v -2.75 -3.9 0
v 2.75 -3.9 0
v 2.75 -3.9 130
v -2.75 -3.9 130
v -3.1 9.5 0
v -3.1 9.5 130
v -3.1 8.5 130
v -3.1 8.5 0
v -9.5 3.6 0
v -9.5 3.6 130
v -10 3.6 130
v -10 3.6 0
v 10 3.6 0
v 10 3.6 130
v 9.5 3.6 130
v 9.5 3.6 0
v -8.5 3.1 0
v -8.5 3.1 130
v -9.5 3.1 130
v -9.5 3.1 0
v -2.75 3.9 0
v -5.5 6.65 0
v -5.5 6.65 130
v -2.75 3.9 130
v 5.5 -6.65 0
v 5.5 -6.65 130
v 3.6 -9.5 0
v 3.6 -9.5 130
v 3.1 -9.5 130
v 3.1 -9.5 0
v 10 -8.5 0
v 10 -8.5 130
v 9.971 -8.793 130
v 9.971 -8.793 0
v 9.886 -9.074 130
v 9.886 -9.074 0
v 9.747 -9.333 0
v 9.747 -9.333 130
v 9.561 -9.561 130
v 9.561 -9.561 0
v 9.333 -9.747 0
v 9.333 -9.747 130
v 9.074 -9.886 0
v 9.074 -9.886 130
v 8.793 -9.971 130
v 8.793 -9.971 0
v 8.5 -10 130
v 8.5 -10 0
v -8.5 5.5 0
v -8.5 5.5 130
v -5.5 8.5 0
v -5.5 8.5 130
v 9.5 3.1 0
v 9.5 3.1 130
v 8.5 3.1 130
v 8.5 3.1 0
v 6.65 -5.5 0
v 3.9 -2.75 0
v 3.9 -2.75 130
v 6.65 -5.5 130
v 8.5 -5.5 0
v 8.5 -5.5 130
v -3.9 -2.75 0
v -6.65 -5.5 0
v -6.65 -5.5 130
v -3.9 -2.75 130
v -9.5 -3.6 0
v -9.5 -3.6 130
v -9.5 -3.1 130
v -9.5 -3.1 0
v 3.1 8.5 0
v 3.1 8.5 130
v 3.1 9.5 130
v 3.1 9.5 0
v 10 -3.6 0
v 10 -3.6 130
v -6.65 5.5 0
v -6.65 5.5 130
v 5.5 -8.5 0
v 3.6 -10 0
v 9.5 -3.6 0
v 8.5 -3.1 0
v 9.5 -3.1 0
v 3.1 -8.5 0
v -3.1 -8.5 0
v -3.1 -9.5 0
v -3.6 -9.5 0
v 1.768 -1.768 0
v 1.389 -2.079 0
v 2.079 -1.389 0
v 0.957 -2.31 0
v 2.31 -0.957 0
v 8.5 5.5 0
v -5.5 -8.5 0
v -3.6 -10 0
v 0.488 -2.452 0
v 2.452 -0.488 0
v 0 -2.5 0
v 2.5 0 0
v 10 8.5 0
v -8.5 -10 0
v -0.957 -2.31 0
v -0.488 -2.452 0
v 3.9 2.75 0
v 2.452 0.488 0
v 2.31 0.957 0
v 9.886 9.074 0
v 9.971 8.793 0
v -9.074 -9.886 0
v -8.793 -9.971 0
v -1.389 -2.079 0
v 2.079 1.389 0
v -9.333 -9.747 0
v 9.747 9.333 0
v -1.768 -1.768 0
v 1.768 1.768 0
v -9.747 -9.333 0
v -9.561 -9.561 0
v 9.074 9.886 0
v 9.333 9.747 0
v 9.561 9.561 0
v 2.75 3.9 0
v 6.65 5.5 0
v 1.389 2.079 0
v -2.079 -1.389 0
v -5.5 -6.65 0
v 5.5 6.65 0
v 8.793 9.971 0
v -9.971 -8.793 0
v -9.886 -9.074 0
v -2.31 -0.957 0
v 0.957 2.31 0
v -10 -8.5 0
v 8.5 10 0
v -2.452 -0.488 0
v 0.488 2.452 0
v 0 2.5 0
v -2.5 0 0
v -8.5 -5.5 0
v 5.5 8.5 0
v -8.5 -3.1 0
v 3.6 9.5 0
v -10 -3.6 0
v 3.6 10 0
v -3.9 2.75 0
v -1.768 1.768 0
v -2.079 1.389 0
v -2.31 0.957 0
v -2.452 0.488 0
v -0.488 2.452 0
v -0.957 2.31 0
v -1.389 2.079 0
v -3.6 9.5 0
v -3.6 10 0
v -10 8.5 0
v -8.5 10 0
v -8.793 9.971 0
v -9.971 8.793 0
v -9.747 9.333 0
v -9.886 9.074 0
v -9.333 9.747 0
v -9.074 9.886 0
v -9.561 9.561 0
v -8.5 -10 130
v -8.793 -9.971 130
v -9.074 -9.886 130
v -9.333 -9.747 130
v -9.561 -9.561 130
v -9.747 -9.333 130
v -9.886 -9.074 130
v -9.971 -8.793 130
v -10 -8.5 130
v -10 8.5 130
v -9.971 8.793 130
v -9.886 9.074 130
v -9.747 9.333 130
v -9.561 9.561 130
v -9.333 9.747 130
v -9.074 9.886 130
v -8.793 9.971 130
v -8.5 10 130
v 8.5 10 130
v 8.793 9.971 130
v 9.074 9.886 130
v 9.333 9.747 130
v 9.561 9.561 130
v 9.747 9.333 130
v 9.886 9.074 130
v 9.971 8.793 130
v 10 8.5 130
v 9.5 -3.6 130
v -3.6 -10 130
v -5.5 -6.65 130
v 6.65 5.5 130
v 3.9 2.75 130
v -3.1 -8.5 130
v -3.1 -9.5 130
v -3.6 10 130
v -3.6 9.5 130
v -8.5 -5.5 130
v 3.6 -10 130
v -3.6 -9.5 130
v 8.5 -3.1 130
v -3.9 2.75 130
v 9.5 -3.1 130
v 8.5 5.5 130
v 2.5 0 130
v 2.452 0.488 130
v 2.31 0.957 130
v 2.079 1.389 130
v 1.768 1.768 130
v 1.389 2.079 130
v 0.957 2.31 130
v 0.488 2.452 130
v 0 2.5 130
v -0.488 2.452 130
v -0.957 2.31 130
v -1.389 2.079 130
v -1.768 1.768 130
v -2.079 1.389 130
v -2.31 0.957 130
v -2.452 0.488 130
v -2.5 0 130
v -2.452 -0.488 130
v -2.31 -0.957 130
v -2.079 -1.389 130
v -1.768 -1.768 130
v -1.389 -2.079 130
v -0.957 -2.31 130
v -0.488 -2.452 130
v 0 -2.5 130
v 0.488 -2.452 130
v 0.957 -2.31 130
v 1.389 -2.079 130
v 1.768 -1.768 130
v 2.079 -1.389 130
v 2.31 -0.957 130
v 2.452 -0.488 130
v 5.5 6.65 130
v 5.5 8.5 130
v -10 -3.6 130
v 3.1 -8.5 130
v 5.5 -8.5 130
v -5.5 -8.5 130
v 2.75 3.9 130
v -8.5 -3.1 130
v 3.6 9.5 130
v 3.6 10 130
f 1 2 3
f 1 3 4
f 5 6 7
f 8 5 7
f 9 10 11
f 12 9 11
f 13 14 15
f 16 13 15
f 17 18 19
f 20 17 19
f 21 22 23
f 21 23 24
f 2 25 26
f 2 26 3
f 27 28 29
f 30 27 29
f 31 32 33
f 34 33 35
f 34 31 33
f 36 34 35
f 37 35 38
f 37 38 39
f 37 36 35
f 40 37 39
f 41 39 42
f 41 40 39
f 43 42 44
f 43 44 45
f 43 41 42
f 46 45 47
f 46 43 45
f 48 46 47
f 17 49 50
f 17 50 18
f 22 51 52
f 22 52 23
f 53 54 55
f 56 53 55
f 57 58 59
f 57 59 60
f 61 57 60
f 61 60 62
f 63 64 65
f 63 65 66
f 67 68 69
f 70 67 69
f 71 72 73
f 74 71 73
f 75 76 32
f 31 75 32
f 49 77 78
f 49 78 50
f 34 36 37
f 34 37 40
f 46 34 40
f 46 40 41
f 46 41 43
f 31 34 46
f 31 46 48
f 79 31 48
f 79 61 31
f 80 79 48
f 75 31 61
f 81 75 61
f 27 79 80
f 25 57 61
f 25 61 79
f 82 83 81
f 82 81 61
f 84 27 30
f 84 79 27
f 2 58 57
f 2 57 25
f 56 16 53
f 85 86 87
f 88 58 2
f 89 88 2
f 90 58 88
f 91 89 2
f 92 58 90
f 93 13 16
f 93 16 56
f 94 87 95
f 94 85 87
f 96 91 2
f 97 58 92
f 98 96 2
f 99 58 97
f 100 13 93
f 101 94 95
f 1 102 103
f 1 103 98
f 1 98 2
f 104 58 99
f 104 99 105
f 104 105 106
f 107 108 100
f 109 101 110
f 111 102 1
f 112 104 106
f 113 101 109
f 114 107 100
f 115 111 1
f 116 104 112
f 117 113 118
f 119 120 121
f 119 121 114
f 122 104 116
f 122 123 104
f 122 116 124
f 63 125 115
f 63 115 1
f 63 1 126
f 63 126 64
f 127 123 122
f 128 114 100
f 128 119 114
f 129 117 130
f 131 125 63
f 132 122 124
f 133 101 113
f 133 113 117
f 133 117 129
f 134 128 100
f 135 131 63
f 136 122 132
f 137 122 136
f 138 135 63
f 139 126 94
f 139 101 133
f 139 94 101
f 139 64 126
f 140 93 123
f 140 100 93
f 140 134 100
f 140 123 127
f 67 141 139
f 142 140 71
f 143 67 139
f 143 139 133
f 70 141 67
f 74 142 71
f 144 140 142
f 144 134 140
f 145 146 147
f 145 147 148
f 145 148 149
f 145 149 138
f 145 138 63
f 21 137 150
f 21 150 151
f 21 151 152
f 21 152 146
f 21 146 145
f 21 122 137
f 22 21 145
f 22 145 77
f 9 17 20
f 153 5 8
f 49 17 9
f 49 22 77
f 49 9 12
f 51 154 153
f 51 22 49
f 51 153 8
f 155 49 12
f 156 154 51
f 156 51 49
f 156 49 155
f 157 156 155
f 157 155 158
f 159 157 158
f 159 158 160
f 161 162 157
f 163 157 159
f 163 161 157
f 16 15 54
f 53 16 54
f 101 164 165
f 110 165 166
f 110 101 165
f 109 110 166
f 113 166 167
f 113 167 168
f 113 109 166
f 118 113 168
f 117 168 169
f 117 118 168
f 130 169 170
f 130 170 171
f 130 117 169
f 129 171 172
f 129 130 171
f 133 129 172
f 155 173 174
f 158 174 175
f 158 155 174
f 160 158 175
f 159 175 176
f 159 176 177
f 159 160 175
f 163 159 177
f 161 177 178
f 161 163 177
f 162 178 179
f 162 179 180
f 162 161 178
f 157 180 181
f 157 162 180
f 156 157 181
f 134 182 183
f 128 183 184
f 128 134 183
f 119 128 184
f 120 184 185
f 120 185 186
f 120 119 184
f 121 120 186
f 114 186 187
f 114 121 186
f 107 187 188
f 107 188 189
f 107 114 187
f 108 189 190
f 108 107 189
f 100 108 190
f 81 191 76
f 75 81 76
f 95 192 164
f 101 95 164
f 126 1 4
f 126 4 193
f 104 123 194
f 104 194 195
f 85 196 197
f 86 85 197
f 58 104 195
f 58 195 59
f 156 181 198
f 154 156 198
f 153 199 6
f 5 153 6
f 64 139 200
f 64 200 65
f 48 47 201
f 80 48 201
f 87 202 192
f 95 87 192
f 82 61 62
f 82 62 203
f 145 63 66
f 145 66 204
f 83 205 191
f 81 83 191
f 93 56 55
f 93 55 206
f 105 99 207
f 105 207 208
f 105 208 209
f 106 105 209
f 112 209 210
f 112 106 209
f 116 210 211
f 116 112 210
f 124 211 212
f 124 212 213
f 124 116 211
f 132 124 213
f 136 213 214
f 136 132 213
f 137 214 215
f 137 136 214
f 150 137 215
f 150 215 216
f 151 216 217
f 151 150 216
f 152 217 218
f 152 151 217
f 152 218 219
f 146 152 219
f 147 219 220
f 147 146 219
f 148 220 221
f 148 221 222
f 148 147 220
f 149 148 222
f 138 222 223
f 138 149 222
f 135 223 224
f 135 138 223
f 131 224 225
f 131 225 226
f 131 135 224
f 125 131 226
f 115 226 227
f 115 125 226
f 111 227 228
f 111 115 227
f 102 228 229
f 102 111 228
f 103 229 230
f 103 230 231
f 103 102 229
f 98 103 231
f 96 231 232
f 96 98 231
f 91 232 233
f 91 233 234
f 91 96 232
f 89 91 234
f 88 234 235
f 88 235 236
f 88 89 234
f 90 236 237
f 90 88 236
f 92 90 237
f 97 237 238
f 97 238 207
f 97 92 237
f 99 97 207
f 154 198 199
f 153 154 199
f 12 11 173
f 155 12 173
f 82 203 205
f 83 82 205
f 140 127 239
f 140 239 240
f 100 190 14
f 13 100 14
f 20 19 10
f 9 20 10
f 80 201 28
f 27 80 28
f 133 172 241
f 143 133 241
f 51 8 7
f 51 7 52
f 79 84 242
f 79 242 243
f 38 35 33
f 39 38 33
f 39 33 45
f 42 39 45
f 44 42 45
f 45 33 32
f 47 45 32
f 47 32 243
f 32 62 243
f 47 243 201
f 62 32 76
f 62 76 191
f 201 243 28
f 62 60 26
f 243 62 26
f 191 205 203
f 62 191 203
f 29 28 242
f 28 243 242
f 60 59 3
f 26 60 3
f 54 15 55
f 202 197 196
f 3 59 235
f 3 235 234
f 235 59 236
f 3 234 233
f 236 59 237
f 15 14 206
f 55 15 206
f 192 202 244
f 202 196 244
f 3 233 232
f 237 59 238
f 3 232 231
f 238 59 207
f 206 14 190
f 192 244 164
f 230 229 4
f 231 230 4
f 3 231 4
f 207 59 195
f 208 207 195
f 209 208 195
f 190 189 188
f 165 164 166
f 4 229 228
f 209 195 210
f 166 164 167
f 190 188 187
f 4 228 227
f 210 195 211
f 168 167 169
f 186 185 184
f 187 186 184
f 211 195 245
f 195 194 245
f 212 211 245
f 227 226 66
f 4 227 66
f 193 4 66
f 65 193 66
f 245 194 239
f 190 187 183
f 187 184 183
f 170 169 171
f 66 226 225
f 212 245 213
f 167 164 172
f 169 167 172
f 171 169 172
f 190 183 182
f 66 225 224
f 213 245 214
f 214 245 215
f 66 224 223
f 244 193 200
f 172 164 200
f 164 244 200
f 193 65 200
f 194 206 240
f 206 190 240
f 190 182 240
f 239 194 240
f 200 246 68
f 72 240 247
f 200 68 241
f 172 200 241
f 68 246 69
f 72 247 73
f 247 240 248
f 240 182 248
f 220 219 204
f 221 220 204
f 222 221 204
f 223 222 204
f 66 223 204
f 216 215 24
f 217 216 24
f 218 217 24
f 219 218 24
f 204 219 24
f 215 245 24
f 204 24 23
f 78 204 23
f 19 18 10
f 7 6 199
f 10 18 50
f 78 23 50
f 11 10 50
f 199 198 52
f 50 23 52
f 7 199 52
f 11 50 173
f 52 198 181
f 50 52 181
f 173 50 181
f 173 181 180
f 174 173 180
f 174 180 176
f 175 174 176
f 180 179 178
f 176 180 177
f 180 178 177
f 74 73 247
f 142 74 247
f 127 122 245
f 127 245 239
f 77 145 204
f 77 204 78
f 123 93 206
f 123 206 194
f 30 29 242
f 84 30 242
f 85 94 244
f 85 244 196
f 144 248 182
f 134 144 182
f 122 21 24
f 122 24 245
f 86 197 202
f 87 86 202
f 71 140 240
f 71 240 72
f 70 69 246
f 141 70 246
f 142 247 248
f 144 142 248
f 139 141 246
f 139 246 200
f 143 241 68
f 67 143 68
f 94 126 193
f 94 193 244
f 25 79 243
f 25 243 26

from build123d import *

# Parameters (mm, degrees)
SKETCH_2_R      = 2.5
EXTRUDE_1_DEPTH = 130


with BuildPart() as part:
    # 草图2 → 凸台-拉伸1 (new body)
    with BuildSketch(Plane.XY):
        with BuildLine():
            Line((-3.6, 10), (-3.6, 9.5))
            Line((-3.6, 9.5), (-3.1, 9.5))
            Line((-3.1, 9.5), (-3.1, 8.5))
            Line((-3.1, 8.5), (-5.5, 8.5))
            Line((-5.5, 8.5), (-5.5, 6.65))
            Line((-5.5, 6.65), (-2.75, 3.9))
            Line((-2.75, 3.9), (2.75, 3.9))
            Line((2.75, 3.9), (5.5, 6.65))
            Line((5.5, 6.65), (5.5, 8.5))
            Line((5.5, 8.5), (3.1, 8.5))
            Line((3.1, 8.5), (3.1, 9.5))
            Line((3.1, 9.5), (3.6, 9.5))
            Line((3.6, 9.5), (3.6, 10))
            Line((3.6, 10), (8.5, 10))
            ThreePointArc((8.5, 10), (9.560660172, 9.560660172), (10, 8.5))
            Line((10, 8.5), (10, 3.6))
            Line((10, 3.6), (9.5, 3.6))
            Line((9.5, 3.6), (9.5, 3.1))
            Line((9.5, 3.1), (8.5, 3.1))
            Line((8.5, 3.1), (8.5, 5.5))
            Line((8.5, 5.5), (6.65, 5.5))
            Line((6.65, 5.5), (3.9, 2.75))
            Line((3.9, 2.75), (3.9, -2.75))
            Line((3.9, -2.75), (6.65, -5.5))
            Line((6.65, -5.5), (8.5, -5.5))
            Line((8.5, -5.5), (8.5, -3.1))
            Line((8.5, -3.1), (9.5, -3.1))
            Line((9.5, -3.1), (9.5, -3.6))
            Line((9.5, -3.6), (10, -3.6))
            Line((10, -3.6), (10, -8.5))
            ThreePointArc((10, -8.5), (9.560660172, -9.560660172), (8.5, -10))
            Line((8.5, -10), (3.6, -10))
            Line((3.6, -10), (3.6, -9.5))
            Line((3.6, -9.5), (3.1, -9.5))
            Line((3.1, -9.5), (3.1, -8.5))
            Line((3.1, -8.5), (5.5, -8.5))
            Line((5.5, -8.5), (5.5, -6.65))
            Line((5.5, -6.65), (2.75, -3.9))
            Line((2.75, -3.9), (-2.75, -3.9))
            Line((-2.75, -3.9), (-5.5, -6.65))
            Line((-5.5, -6.65), (-5.5, -8.5))
            Line((-5.5, -8.5), (-3.1, -8.5))
            Line((-3.1, -8.5), (-3.1, -9.5))
            Line((-3.1, -9.5), (-3.6, -9.5))
            Line((-3.6, -9.5), (-3.6, -10))
            Line((-3.6, -10), (-8.5, -10))
            ThreePointArc((-8.5, -10), (-9.560660172, -9.560660172), (-10, -8.5))
            Line((-10, -8.5), (-10, -3.6))
            Line((-10, -3.6), (-9.5, -3.6))
            Line((-9.5, -3.6), (-9.5, -3.1))
            Line((-9.5, -3.1), (-8.5, -3.1))
            Line((-8.5, -3.1), (-8.5, -5.5))
            Line((-8.5, -5.5), (-6.65, -5.5))
            Line((-6.65, -5.5), (-3.9, -2.75))
            Line((-3.9, -2.75), (-3.9, 2.75))
            Line((-3.9, 2.75), (-6.65, 5.5))
            Line((-6.65, 5.5), (-8.5, 5.5))
            Line((-8.5, 5.5), (-8.5, 3.1))
            Line((-8.5, 3.1), (-9.5, 3.1))
            Line((-9.5, 3.1), (-9.5, 3.6))
            Line((-9.5, 3.6), (-10, 3.6))
            Line((-10, 3.6), (-10, 8.5))
            ThreePointArc((-10, 8.5), (-9.560660172, 9.560660172), (-8.5, 10))
            Line((-8.5, 10), (-3.6, 10))
        make_face()
        Circle(SKETCH_2_R, mode=Mode.SUBTRACT)
    extrude(amount=EXTRUDE_1_DEPTH)


solid = part.part
